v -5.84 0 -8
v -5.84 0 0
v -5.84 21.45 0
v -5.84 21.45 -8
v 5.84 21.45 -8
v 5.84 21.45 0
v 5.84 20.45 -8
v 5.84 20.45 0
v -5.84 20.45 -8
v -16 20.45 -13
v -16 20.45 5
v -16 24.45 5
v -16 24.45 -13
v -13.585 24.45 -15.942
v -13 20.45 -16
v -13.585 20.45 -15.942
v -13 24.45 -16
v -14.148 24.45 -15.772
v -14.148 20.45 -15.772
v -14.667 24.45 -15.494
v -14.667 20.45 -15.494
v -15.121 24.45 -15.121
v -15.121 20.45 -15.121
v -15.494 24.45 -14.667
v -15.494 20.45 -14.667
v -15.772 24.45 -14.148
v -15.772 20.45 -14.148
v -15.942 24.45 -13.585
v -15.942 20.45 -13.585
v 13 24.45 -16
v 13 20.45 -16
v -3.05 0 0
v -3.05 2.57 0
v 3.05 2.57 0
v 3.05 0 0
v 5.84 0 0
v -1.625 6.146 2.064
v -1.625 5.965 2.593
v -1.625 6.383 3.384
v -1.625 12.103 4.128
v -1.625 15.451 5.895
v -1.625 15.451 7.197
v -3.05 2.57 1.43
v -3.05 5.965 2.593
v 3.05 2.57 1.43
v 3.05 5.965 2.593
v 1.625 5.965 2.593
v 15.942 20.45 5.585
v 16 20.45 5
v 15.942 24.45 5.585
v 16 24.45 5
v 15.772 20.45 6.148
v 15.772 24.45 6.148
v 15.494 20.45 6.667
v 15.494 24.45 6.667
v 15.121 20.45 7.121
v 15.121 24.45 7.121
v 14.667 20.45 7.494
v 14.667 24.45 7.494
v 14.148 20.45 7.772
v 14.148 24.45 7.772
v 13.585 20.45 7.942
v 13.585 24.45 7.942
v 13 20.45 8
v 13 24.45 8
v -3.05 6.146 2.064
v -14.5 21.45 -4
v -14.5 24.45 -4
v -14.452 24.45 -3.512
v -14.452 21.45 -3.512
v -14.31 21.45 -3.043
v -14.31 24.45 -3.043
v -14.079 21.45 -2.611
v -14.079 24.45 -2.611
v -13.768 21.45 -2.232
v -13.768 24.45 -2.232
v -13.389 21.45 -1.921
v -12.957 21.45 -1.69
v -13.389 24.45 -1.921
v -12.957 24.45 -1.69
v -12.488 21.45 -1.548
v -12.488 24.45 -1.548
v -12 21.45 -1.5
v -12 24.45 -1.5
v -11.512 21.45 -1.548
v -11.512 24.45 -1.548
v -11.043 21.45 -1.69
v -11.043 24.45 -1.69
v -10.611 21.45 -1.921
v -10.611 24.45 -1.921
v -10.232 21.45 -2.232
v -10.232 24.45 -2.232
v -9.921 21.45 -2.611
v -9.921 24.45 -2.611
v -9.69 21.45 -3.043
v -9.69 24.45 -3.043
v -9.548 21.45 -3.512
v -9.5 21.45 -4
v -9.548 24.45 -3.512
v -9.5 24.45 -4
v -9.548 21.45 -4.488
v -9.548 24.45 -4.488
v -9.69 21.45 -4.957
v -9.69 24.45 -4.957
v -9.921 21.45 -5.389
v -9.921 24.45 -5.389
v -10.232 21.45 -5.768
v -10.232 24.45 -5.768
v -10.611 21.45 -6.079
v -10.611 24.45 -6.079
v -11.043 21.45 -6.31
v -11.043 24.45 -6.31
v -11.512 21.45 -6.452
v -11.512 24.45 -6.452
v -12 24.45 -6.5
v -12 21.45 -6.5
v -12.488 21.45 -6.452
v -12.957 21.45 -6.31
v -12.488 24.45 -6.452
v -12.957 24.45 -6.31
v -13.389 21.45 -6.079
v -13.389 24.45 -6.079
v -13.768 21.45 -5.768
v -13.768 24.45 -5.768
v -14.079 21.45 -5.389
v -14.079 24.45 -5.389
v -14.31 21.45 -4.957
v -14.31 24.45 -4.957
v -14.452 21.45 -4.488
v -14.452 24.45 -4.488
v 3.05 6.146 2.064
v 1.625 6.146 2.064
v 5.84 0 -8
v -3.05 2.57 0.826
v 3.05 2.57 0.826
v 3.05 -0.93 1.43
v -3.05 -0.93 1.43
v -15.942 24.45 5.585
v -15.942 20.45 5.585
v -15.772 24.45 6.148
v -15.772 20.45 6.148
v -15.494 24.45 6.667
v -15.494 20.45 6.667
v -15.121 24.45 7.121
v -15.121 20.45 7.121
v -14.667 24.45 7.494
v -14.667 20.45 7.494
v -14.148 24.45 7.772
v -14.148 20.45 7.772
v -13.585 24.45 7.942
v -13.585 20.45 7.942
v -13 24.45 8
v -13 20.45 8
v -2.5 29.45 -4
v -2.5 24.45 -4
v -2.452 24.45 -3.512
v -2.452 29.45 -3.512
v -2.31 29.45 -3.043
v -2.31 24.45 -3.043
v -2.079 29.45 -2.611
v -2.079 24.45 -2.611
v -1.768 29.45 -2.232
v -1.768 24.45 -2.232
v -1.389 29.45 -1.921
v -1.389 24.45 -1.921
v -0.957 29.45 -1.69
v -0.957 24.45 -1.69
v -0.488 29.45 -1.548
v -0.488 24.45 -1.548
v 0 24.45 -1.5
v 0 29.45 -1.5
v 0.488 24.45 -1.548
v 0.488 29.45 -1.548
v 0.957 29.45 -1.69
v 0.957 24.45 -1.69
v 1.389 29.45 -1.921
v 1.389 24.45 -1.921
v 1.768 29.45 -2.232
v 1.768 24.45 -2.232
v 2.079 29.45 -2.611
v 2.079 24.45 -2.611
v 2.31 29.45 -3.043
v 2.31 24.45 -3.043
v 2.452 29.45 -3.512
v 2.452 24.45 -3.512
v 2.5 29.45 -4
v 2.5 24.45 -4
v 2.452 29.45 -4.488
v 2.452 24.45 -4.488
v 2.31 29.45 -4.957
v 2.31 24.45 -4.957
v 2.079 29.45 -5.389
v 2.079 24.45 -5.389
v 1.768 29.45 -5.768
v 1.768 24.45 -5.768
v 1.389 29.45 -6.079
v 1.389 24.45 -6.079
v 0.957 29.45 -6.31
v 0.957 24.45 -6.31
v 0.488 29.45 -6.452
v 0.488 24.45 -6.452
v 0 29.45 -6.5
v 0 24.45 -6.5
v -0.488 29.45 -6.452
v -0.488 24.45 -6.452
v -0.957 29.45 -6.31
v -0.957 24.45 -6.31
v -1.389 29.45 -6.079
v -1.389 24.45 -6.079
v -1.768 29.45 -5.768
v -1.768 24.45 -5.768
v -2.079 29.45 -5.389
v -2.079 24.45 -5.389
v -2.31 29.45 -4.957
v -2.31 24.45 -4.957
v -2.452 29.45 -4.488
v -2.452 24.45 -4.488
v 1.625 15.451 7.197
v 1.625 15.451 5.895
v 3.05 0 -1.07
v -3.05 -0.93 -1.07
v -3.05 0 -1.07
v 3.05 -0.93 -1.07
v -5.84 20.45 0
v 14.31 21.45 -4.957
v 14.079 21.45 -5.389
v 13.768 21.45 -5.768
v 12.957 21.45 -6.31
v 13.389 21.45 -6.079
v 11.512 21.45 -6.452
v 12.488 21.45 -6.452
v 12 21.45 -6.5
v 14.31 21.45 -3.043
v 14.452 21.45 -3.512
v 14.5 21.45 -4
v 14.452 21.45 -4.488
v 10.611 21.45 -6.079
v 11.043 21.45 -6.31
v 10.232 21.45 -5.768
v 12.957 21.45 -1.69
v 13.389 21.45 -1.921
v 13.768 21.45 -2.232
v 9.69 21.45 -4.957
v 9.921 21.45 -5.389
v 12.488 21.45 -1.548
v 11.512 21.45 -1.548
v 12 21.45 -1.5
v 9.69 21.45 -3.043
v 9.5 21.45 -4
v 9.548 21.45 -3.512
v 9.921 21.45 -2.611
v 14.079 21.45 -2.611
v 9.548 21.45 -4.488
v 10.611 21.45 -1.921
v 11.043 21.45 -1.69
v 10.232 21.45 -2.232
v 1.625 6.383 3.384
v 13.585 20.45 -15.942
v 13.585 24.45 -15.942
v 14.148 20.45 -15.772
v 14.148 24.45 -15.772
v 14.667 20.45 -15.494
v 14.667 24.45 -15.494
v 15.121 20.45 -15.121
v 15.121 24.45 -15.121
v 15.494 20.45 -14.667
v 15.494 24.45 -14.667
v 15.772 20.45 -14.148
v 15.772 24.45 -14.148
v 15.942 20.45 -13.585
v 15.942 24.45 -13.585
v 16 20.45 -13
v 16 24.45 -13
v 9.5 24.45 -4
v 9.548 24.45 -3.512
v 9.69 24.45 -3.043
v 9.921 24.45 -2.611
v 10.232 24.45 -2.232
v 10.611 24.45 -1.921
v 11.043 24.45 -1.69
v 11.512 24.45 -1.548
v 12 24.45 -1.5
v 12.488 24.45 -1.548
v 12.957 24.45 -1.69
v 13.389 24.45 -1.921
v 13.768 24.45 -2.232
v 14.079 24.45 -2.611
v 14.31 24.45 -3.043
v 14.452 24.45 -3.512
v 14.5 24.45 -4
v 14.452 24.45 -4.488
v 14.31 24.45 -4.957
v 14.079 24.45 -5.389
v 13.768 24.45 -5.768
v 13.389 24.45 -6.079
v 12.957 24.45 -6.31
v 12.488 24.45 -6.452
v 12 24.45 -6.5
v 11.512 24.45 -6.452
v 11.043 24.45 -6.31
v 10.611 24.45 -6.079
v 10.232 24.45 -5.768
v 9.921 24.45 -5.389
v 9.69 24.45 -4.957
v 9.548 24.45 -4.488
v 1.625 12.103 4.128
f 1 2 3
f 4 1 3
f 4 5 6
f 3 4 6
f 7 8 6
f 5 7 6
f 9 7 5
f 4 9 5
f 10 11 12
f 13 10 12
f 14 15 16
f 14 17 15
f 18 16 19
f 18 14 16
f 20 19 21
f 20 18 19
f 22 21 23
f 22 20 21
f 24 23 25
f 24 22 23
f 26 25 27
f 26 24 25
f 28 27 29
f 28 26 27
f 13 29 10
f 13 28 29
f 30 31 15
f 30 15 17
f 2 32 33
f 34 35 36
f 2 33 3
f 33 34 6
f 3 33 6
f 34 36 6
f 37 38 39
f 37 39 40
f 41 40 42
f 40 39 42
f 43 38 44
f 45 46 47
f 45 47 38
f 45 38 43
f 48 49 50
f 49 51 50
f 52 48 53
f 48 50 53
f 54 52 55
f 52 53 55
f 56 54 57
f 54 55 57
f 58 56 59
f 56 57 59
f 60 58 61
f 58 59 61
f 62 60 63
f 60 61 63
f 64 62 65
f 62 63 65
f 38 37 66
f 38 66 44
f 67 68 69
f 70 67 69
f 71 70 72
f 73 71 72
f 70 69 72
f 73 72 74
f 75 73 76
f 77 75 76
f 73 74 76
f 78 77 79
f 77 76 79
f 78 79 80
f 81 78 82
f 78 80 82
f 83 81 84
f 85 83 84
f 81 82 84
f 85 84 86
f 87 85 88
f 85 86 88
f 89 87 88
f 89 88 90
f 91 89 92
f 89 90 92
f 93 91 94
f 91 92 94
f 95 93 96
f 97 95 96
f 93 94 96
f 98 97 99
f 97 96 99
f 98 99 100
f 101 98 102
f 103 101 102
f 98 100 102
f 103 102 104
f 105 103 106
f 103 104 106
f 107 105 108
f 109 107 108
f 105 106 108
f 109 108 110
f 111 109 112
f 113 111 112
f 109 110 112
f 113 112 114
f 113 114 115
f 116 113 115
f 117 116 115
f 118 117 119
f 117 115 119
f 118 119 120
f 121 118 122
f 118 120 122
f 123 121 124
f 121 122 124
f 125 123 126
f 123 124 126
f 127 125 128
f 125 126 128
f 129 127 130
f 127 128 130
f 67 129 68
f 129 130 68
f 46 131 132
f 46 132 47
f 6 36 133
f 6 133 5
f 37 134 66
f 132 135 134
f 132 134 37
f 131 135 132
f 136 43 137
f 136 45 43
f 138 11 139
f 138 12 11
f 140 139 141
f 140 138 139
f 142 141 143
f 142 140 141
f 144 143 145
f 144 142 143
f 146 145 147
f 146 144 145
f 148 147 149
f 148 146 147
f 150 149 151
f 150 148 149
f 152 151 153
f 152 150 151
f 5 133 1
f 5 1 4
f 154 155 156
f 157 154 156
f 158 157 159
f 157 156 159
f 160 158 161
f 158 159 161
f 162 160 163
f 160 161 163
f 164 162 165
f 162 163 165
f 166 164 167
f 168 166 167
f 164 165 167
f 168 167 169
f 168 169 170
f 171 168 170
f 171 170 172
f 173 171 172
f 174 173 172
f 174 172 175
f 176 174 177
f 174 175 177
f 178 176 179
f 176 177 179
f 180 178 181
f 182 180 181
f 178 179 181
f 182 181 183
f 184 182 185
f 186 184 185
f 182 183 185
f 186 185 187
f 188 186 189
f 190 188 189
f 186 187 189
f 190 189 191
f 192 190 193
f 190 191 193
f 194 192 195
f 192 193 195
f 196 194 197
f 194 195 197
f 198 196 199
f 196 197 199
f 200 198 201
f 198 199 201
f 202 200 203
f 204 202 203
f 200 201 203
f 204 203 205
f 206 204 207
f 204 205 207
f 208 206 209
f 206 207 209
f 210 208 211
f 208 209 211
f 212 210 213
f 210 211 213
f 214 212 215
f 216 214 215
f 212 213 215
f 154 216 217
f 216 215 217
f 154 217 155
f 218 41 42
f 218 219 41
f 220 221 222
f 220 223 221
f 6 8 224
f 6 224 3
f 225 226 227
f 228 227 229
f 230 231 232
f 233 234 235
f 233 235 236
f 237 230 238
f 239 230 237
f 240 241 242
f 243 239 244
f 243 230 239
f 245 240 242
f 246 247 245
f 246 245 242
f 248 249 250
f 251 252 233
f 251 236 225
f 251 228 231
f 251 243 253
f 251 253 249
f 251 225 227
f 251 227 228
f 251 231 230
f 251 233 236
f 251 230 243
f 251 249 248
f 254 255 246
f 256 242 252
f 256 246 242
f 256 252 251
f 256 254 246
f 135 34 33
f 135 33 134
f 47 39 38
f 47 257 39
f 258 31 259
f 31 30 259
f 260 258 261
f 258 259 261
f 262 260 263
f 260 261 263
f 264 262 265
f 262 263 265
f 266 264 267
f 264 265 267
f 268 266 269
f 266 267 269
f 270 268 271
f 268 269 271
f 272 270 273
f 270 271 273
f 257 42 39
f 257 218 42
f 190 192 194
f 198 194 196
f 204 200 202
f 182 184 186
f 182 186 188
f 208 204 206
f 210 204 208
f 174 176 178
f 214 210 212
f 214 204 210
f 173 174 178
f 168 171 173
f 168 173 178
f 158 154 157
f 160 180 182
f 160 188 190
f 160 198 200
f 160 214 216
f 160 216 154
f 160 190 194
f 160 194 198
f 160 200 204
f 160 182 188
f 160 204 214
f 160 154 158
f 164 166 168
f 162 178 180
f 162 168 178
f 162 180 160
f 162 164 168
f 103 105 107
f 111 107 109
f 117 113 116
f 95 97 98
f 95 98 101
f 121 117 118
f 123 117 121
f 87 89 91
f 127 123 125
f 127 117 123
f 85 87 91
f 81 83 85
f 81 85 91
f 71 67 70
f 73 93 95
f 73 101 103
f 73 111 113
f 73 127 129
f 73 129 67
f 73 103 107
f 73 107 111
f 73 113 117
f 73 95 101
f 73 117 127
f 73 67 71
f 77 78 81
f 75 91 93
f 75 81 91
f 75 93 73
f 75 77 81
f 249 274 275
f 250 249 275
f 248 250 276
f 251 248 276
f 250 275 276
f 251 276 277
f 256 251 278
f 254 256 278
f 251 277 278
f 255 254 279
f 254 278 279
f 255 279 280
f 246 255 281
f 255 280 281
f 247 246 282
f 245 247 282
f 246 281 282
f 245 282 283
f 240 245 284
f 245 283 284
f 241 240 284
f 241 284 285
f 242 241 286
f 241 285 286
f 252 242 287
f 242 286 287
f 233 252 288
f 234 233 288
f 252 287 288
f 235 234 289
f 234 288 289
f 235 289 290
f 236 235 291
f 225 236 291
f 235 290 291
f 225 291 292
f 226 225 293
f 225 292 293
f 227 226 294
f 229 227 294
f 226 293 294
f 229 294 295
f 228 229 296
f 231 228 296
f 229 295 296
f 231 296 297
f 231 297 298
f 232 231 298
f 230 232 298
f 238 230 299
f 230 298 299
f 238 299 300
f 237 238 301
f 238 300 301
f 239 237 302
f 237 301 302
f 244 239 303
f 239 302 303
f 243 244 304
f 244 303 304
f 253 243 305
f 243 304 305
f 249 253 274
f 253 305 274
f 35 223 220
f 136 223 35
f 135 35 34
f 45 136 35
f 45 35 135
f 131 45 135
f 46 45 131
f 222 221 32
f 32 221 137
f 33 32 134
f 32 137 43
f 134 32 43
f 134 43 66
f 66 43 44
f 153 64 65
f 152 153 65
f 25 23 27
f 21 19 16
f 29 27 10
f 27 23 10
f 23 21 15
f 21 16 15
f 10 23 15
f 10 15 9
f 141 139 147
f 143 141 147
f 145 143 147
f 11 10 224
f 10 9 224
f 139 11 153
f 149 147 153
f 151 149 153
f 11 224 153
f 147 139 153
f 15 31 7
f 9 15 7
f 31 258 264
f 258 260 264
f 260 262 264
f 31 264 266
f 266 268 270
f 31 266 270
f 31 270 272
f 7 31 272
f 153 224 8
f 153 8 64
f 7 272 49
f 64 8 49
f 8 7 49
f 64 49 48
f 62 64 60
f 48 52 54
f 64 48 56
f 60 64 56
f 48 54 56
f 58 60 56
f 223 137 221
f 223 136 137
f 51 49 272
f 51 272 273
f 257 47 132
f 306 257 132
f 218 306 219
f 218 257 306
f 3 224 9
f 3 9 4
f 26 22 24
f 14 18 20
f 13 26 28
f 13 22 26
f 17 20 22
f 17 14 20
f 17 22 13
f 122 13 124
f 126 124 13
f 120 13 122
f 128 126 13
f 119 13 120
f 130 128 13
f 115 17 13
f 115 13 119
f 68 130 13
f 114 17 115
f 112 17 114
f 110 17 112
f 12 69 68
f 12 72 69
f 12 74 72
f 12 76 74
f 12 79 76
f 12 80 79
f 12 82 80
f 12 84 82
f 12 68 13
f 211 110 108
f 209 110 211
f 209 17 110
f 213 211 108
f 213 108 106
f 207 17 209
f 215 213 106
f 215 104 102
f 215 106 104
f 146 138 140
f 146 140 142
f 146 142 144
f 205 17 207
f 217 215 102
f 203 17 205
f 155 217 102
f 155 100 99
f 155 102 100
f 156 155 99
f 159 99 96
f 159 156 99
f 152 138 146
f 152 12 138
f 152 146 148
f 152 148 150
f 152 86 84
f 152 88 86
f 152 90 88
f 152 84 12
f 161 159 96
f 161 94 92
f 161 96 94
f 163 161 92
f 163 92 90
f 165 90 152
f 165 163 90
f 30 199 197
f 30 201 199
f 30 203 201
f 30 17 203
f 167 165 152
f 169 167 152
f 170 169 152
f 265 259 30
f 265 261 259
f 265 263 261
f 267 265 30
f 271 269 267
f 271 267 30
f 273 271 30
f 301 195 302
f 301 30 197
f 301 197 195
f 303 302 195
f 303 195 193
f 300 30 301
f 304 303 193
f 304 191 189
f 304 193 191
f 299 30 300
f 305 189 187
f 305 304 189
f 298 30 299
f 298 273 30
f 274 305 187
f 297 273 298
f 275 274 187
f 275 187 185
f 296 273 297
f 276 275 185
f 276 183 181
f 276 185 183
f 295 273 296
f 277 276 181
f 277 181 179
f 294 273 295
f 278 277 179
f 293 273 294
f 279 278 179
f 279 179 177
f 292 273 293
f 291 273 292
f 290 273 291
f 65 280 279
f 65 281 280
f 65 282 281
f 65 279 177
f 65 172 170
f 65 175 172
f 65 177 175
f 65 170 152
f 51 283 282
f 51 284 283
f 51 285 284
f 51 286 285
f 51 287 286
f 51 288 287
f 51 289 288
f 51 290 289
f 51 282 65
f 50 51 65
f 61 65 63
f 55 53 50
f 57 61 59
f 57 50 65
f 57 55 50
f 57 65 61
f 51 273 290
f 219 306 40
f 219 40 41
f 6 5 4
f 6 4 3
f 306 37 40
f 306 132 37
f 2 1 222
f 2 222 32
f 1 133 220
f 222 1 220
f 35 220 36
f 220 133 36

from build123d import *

# Parameters (mm, degrees)
F0_W          = 21.45
F0_H          = 8
F1_DEPTH      = 5.84
F1_DEPTH_BACK = 5.84
F3_DEPTH      = 3.05
F3_DEPTH_BACK = 3.05
F4_DEPTH      = 1.625
F4_DEPTH_BACK = 1.625
F5_W          = 4
F5_H          = 24
F6_DEPTH      = 16
F6_DEPTH_BACK = 16
F8_R          = 2.5
F9_DEPTH      = 3
F10_DEPTH     = 5
F11_R         = 3


with BuildPart() as f1:
    # F0 (on Right) → F1 (new body, two sides)
    with BuildSketch(Plane.YZ) as f1_sk:
        with Locations((10.725, -4)):
            Rectangle(F0_W, F0_H)
    extrude(amount=F1_DEPTH)
    extrude(f1_sk.sketch, amount=-F1_DEPTH_BACK)

    # F2 (on Right) → F3 (join, two sides)
    with BuildSketch(Plane.YZ) as f3_sk:
        Polygon((-0.93, -1.069501), (0, -1.069501), (0, 0), (2.57, 0), (2.57, 0.825999), (6.145543, 2.064358), (5.964502, 2.593), (2.57, 1.430499), (-0.93, 1.430499), align=None)
    extrude(amount=F3_DEPTH)
    extrude(f3_sk.sketch, amount=-F3_DEPTH_BACK)

    # F2 (on Right) → F4 (join, two sides)
    with BuildSketch(Plane.YZ) as f4_sk:
        Polygon((6.383002, 3.3835), (5.964502, 2.593), (6.145543, 2.064358), (12.102503, 4.1275), (15.450504, 5.894501), (15.450504, 7.196501), align=None)
    extrude(amount=F4_DEPTH)
    extrude(f4_sk.sketch, amount=-F4_DEPTH_BACK)


with BuildPart() as f6:
    # F5 (on Right) → F6 (new body, two sides)
    with BuildSketch(Plane.YZ) as f6_sk:
        with Locations((22.45, -4)):
            Rectangle(F5_W, F5_H)
    extrude(amount=F6_DEPTH)
    extrude(f6_sk.sketch, amount=-F6_DEPTH_BACK)

    # F7: cut F1
    add(f1.part, mode=Mode.SUBTRACT)

    # F8 (on face) → F9 (cut)
    with BuildSketch(Plane(origin=(0, 24.45, 0), x_dir=(-1, 0, 0), z_dir=(0, 1, 0))):
        with Locations((-12, -4)):
            Circle(F8_R)
        with Locations((12, -4)):
            Circle(F8_R)
    extrude(amount=-F9_DEPTH, mode=Mode.SUBTRACT)

    # F8 (on face) → F10 (join)
    with BuildSketch(Plane(origin=(0, 24.45, 0), x_dir=(-1, 0, 0), z_dir=(0, 1, 0))):
        with Locations((0, -4)):
            Circle(F8_R)
    extrude(amount=F10_DEPTH)

    # F11
    f11_edges = [f6.edges().sort_by_distance(p)[0] for p in [
        (-16, 22.45, 8),
        (-16, 22.45, -16),
        (16, 22.45, -16),
        (16, 22.45, 8),
    ]]
    fillet(f11_edges, radius=F11_R)


solid = Compound([f1.part, f6.part])
